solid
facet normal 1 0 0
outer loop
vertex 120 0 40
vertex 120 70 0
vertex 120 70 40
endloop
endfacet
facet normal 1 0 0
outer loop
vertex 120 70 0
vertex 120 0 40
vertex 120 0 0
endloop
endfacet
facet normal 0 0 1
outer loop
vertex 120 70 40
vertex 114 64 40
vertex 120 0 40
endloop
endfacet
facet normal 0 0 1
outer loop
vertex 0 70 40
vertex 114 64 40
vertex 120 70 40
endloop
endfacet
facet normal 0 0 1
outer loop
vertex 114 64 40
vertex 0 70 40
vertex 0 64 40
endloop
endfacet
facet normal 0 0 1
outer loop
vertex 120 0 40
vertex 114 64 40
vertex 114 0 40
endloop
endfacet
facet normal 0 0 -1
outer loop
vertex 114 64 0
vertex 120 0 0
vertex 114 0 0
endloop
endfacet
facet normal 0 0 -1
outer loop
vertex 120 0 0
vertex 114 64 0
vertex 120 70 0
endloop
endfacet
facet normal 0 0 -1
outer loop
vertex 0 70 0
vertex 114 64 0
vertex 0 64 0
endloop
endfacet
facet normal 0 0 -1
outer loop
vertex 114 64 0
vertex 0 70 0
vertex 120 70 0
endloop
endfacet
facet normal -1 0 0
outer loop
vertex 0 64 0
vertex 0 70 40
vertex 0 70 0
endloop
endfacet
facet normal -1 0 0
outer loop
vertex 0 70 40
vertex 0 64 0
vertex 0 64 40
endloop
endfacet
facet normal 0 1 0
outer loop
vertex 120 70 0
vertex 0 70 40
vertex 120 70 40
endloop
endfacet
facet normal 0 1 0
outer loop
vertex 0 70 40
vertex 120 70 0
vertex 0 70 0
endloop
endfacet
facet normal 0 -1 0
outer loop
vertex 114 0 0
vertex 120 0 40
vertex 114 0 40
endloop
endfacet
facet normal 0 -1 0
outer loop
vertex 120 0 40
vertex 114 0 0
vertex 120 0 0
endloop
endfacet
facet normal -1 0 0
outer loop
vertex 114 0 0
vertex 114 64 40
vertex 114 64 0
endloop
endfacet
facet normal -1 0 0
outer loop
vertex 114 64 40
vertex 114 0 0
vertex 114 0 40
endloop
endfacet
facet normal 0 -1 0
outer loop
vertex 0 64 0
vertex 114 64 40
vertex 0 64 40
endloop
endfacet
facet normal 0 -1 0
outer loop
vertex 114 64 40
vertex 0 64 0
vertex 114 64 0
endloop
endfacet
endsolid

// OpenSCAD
// Buffer Tank for Mini Horizontal Gel Electrophoresis
// Units: millimetres

// Outer Dimensions
$outer_x = 120;
$outer_y = 70;
$outer_z = 40;

// Wall and Floor Thickness
$wall_thick = 3;
$floor_thick = 3;

// Platform Dimensions
$platform_len = 60;      // Length in X
$platform_height = 10;   // Height above inner floor
$platform_top_z = $floor_thick + $platform_height; // Z position of platform top (13)

// Hole Dimensions
$hole_dia = 2;
$hole_y = 0;
$hole_z = 30;

// Rendering settings
$fn = 64;

// Calculate Inner Dimensions
$inner_x = $outer_x - 2 * $wall_thick;
$inner_y = $outer_y - 2 * $wall_thick;
$inner_z = $outer_z - $floor_thick;

// Build the tank
difference() {
    // 1. Create the main outer block
    cube([
        $outer_x, 
        $outer_y, 
        $outer_z
    ]);

    // 2. Cut out the main inner cavity (creates walls and floor thickness)
    // This removes the space inside the walls and the space above the floor
    translate([0, 0, 0]) {
        cube([
            $inner_x, 
            $inner_y, 
            $outer_z - $floor_thick
        ]);
    }

    // 3. Cut out the top opening (make it open-top)
    // The cavity cut above goes up to ($outer_z - $floor_thick).
    // We need to remove the space above that up to the top of the tank.
    translate([0, 0, $outer_z - $floor_thick]) {
        cube([
            $inner_x, 
            $inner_y, 
            $floor_thick // Remove the top 3mm layer to open it
        ]);
    }

    // 4. Cut out the platform void
    // The platform is solid, so we remove the space it occupies.
    // It sits on the floor (z = $floor_thick) and goes up to $platform_top_z.
    // It spans the full inner width ($inner_y) and is centered in X.
    translate([
        ($outer_x - $platform_len) / 2, 
        0, 
        $floor_thick
    ]) {
        cube([
            $platform_len, 
            $inner_y, 
            $platform_height
        ]);
    }

    // 5. Drill electrode holes
    // Hole position: y = $hole_y, z = $hole_z
    // We need to cut a cylinder through the end walls along the X axis.
    // The hole is at Y=0, Z=30.
    // We place a cylinder centered at (0, $hole_y, $hole_z) with length > $outer_x.
    translate([
        0, 
        $hole_y, 
        $hole_z
    ]) {
        cylinder(
            h = $outer_x + 10, // Extend past both ends to ensure clean cut
            r = $hole_dia / 2,
            center = true
        );
    }
}
